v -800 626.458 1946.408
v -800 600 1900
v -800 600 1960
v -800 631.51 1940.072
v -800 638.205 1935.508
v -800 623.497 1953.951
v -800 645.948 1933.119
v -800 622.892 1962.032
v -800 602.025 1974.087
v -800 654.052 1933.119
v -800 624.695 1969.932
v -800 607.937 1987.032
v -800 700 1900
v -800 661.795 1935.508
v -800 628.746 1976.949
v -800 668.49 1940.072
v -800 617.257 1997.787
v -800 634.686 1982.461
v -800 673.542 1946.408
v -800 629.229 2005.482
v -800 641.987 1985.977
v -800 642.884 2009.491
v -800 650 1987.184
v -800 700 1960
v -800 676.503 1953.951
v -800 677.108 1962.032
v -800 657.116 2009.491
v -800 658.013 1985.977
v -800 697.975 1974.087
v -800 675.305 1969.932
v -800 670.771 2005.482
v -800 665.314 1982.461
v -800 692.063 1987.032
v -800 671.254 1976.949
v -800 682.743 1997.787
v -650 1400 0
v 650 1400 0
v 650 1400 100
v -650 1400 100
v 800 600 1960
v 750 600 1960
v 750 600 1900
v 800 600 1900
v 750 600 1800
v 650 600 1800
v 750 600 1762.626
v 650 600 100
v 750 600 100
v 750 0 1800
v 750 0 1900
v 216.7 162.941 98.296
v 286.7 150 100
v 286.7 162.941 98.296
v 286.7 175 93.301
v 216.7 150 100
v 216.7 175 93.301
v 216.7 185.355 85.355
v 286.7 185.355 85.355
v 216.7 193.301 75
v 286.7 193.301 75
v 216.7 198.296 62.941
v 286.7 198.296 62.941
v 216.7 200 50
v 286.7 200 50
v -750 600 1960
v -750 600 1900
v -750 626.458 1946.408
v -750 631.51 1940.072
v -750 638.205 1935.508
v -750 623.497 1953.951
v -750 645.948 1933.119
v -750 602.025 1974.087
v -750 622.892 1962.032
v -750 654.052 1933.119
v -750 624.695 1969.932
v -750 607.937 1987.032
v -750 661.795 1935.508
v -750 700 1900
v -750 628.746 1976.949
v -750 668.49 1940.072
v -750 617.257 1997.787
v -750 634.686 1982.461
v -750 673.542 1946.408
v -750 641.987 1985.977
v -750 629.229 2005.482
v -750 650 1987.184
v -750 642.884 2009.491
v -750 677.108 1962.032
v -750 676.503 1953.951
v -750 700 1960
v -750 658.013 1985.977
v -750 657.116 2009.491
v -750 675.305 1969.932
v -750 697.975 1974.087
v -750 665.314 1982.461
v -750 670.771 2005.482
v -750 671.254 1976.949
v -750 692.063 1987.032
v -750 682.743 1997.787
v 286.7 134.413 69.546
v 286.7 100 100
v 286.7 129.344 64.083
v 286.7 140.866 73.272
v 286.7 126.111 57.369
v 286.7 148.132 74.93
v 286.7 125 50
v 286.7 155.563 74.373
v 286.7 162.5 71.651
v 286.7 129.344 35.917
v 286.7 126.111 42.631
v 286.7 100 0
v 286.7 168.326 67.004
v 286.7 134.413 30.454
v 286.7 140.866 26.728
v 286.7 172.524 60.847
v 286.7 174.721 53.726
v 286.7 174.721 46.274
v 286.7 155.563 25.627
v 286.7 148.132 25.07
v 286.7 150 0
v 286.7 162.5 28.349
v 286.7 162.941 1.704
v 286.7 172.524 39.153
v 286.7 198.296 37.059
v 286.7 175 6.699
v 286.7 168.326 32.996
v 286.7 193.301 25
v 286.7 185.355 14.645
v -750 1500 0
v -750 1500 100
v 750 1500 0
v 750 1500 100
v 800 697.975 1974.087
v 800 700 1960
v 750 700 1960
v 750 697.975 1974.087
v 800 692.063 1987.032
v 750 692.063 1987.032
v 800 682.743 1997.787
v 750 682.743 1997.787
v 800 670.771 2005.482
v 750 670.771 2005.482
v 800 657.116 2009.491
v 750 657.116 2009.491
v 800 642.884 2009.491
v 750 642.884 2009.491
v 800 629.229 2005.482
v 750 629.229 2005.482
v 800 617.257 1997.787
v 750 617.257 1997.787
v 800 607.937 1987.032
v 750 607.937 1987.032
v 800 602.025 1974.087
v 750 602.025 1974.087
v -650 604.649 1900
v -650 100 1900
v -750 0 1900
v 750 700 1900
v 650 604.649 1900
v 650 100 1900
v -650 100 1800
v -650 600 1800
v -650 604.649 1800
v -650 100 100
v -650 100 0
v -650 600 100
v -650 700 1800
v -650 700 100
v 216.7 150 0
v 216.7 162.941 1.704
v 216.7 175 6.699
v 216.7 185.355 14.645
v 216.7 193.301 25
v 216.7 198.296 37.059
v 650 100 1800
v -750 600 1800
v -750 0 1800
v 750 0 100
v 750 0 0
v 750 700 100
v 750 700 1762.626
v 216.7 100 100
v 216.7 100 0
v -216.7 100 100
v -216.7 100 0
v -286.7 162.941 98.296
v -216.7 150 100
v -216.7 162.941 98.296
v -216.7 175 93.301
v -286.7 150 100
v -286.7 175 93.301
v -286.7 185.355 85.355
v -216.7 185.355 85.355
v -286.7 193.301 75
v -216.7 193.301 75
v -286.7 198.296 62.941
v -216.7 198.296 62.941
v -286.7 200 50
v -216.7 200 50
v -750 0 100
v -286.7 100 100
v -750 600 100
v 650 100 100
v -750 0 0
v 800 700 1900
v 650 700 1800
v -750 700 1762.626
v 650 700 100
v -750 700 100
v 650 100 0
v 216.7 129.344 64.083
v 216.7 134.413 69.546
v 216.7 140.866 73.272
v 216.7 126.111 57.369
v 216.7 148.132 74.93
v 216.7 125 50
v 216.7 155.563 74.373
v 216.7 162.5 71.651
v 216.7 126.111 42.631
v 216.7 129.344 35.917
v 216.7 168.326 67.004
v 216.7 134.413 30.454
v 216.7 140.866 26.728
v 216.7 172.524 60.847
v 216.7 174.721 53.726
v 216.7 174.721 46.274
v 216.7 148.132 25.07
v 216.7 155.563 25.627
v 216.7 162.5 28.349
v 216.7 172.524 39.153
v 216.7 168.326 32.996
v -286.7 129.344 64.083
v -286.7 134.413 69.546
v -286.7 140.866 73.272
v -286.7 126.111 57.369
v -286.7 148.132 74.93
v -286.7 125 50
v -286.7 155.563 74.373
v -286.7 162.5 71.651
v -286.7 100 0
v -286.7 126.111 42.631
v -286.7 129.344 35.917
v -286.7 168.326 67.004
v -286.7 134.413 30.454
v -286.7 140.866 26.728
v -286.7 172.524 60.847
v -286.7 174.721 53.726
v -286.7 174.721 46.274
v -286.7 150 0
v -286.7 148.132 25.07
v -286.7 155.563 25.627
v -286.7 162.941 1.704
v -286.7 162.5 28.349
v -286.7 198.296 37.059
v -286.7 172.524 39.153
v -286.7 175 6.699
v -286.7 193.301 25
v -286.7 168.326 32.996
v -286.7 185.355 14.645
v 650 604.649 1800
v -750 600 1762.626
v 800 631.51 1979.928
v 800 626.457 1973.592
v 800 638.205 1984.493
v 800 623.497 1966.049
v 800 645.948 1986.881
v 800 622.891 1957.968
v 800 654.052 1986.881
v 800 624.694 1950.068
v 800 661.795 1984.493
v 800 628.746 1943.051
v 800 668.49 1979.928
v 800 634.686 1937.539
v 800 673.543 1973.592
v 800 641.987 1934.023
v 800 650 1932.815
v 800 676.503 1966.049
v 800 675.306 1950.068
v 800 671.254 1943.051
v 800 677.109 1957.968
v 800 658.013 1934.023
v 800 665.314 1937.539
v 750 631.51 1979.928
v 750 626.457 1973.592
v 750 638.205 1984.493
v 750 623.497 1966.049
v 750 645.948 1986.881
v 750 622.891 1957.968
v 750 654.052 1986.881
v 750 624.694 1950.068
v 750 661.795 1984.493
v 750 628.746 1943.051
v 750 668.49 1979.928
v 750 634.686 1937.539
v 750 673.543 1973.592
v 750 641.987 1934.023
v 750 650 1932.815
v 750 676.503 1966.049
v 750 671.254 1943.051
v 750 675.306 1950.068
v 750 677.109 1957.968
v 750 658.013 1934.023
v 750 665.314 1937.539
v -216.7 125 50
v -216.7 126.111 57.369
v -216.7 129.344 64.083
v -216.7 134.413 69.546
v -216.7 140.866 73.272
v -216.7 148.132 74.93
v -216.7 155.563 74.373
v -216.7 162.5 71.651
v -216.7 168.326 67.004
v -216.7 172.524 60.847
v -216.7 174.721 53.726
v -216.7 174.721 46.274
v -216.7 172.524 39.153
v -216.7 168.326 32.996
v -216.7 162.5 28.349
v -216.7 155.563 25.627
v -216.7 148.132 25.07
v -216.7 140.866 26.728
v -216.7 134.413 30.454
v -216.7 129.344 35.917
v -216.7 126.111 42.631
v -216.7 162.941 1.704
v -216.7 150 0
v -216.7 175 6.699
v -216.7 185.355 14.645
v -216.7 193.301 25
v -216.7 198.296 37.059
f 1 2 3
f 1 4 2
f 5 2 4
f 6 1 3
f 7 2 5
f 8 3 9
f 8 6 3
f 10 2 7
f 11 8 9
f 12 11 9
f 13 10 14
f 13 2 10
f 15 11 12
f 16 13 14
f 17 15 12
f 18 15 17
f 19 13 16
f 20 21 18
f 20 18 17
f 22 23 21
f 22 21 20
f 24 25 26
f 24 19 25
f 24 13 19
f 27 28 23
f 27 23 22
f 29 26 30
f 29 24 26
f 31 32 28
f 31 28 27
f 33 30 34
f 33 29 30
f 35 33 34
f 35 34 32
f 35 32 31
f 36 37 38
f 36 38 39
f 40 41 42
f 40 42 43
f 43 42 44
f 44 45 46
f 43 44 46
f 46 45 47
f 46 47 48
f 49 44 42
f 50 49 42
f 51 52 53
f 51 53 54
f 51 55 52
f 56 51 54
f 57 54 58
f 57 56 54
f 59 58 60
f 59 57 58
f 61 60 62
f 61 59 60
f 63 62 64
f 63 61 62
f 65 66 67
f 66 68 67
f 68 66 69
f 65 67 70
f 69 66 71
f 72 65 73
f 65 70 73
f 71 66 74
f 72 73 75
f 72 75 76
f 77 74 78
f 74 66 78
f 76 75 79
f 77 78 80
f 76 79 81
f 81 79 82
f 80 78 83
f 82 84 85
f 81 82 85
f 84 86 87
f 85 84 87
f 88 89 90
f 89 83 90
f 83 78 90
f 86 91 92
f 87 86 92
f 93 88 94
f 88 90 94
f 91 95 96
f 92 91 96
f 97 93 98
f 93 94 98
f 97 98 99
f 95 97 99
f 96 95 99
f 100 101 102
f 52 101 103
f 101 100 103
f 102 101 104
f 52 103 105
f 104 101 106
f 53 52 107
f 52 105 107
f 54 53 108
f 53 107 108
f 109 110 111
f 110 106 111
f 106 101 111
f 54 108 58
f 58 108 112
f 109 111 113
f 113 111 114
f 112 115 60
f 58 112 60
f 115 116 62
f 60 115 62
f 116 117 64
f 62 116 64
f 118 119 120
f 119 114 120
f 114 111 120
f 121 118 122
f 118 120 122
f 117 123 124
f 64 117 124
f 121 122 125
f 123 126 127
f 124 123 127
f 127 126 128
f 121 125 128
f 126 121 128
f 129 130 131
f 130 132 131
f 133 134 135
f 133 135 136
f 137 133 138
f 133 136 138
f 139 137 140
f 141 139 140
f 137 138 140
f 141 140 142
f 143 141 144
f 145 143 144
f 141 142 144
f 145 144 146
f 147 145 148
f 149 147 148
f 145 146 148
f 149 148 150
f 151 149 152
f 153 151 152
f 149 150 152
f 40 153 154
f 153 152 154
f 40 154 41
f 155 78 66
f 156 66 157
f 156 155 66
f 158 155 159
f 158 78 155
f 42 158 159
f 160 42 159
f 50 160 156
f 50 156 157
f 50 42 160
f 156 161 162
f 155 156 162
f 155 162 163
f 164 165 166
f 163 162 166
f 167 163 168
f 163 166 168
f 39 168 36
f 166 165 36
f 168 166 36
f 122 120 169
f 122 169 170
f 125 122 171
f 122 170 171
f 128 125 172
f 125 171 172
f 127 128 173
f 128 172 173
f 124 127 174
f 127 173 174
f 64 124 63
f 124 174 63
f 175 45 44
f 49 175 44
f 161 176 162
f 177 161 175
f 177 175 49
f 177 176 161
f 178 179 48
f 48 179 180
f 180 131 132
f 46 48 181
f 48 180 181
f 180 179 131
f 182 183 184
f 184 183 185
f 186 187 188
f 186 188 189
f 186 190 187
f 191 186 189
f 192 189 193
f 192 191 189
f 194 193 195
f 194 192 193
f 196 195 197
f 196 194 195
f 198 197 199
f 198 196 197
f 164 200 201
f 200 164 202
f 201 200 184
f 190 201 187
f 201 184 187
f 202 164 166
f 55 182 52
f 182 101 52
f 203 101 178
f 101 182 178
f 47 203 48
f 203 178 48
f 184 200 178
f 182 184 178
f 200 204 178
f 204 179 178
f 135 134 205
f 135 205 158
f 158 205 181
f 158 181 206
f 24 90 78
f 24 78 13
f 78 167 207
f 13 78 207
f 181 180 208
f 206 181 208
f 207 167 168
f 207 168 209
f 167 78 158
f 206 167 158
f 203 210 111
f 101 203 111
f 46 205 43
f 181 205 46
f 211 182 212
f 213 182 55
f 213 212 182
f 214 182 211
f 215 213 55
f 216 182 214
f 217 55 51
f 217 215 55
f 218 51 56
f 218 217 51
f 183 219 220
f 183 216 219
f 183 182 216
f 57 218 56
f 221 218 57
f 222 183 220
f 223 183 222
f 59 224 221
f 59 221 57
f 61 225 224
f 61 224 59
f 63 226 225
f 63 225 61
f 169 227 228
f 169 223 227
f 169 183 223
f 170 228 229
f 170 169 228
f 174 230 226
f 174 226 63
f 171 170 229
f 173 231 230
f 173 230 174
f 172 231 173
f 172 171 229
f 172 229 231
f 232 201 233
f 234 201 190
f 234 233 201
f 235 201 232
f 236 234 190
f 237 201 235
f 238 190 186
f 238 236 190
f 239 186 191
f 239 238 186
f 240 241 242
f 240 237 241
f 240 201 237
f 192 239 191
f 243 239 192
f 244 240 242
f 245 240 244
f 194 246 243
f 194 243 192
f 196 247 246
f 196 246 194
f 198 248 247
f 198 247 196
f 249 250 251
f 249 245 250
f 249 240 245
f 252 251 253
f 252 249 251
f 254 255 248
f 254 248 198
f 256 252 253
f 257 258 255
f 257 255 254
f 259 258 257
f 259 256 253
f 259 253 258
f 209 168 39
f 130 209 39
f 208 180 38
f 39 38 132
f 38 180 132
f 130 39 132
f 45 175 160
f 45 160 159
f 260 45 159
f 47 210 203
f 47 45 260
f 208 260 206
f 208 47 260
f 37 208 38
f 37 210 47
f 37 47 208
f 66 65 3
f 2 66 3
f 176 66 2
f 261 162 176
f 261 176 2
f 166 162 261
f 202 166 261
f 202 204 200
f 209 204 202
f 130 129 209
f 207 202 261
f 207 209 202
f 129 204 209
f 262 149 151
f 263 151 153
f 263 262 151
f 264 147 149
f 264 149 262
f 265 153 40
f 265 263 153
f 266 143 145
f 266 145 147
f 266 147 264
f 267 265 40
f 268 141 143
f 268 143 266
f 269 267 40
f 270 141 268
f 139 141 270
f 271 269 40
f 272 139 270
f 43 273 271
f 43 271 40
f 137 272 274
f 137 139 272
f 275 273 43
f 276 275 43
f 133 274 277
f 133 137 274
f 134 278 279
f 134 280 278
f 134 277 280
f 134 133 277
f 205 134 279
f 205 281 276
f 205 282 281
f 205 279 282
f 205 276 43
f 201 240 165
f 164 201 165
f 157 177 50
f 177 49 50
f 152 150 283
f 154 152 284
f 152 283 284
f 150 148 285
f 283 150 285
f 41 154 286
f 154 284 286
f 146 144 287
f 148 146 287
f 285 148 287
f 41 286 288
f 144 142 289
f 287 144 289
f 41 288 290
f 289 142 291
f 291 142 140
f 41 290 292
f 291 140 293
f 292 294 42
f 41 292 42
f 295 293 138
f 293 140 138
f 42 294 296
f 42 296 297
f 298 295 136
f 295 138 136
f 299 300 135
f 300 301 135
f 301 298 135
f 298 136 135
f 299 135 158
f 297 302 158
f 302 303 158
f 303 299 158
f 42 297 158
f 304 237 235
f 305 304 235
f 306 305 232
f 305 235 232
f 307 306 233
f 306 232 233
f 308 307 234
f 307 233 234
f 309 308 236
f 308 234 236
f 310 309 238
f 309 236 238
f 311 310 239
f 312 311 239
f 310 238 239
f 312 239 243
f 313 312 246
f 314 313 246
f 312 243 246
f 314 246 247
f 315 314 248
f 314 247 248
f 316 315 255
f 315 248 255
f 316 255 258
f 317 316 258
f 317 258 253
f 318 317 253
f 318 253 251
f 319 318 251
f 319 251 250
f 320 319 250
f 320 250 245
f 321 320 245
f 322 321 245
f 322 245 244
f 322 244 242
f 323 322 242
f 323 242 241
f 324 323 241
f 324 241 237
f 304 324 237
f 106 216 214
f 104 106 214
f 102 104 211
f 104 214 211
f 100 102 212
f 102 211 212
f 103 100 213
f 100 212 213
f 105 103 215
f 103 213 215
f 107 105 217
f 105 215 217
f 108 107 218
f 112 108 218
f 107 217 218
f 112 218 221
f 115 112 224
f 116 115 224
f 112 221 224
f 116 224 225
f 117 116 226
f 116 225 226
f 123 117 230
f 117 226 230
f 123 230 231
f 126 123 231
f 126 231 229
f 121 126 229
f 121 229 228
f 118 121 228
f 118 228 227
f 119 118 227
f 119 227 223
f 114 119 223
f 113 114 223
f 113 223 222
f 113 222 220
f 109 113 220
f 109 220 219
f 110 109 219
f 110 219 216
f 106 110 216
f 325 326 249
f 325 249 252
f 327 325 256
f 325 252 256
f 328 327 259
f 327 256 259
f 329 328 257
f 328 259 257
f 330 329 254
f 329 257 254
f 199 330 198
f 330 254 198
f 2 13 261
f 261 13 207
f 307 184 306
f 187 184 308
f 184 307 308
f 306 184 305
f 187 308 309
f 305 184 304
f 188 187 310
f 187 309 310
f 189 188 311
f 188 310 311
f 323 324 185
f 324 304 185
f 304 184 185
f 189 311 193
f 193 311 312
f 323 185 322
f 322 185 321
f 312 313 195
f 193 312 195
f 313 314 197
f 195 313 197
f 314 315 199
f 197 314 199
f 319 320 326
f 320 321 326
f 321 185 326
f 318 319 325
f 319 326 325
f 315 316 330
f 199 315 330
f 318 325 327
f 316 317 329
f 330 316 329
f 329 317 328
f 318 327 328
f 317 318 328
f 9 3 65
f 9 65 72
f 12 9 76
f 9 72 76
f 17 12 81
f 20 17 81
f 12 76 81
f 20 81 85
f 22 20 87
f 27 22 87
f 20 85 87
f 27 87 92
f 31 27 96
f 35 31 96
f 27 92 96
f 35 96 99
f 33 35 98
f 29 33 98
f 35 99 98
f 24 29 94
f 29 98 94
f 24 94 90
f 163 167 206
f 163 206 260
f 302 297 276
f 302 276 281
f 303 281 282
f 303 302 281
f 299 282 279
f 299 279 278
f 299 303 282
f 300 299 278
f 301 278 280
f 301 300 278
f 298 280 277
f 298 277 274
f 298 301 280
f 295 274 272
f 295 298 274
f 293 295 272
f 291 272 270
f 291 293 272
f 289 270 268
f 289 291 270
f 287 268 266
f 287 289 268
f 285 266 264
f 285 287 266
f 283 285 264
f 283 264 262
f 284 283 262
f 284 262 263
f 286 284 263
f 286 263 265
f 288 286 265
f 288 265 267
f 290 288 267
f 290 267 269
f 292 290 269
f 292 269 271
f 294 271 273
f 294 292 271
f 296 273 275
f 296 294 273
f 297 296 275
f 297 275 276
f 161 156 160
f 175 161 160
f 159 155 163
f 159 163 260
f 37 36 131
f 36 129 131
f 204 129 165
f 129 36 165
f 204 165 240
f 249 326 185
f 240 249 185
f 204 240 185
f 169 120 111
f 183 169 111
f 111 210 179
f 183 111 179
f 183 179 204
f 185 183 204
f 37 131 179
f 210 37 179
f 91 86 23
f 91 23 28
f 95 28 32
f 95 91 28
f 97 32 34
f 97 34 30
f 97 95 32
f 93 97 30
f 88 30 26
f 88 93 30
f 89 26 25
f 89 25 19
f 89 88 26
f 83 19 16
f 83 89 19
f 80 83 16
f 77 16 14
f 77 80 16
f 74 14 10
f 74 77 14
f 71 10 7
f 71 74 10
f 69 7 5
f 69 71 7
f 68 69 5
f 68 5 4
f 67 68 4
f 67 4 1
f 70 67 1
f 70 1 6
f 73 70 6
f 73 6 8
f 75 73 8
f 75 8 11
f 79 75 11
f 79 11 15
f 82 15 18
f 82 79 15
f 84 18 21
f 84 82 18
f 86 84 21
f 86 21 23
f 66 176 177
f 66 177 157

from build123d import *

# Parameters (mm, degrees)
SALIENTE_EXTRUIR1_DEPTH = 750
CORTAR_EXTRUIR4_REACH   = 2536.265
CROQUIS3_W              = 1300
CROQUIS3_H              = 1300
CORTAR_EXTRUIR5_REACH   = 2536.265
CROQUIS4_W              = 1300
CROQUIS4_H              = 504.649156168
CROQUIS5_R              = 27.184697772
SALIENTE_EXTRUIR2_DEPTH = 50
SALIENTE_EXTRUIR3_DEPTH = 100
CROQUIS8_R              = 27.1845
SALIENTE_EXTRUIR4_DEPTH = 50
SALIENTE_EXTRUIR5_DEPTH = 100
CROQUIS11_W             = 70
CROQUIS11_H             = 100
SALIENTE_EXTRUIR6_DEPTH = 100
REDONDEO1_R             = 50
CORTAR_EXTRUIR6_REACH   = 2735.316
CROQUIS12_R             = 25


with BuildPart() as part:
    # Croquis1 → Saliente-Extruir1 (new, symmetric)
    with BuildSketch(Plane(origin=(0, 0, 0), x_dir=(0, 0, -1), z_dir=(1, 0, 0))):
        Polygon((-100, 700), (-100, 1500), (0, 1500), (0, 0), (-100, 0), (-100, 600), (-1800, 600), (-1800, 0), (-1900, 0), (-1900, 600), (-1900, 700), align=None)
    extrude(amount=SALIENTE_EXTRUIR1_DEPTH, both=True)

    # Cortar-Extruir4: up to this face of the body (flat: up to its plane)
    cortar_extruir4_end = Plane(part.part.faces().sort_by_distance((0, 300, 1800))[0])
    # Croquis3 → Cortar-Extruir4 (cut, up to the picked face)
    with BuildSketch(Plane(origin=(0, 0, 0), x_dir=(-1, 0, 0), z_dir=(0, 0, -1)), mode=Mode.PRIVATE) as cortar_extruir4_sk1:
        with Locations((0, 750)):
            Rectangle(CROQUIS3_W, CROQUIS3_H)
    cortar_extruir4_tool1 = split(extrude(cortar_extruir4_sk1.sketch, amount=-CORTAR_EXTRUIR4_REACH, mode=Mode.PRIVATE), bisect_by=cortar_extruir4_end, keep=Keep.BOTH, mode=Mode.PRIVATE)
    add(cortar_extruir4_tool1.solids().sort_by(Axis((0, 750, 0), (0, 0, 1)))[0], mode=Mode.SUBTRACT)

    # Croquis4 → Cortar-Extruir5 (cut, up to next)
    with BuildSketch(Plane.XY.offset(1900), mode=Mode.PRIVATE) as cortar_extruir5_sk1:
        with Locations((0, 352.324578084)):
            Rectangle(CROQUIS4_W, CROQUIS4_H)
    cortar_extruir5_tool1 = extrude(cortar_extruir5_sk1.sketch, amount=-CORTAR_EXTRUIR5_REACH, mode=Mode.PRIVATE) & part.part
    add(cortar_extruir5_tool1.solids().sort_by_distance((0, 352.324578, 1900))[0], mode=Mode.SUBTRACT)



with BuildPart() as body_2:
    # Croquis5 → Saliente-Extruir2 (new body)
    with BuildSketch(Plane(origin=(750, 0, 0), x_dir=(0, 0, -1), z_dir=(1, 0, 0))):
        with BuildLine():
            Line((-1960, 600), (-1900, 600))
            Line((-1900, 600), (-1900, 700))
            Line((-1900, 700), (-1960, 700))
            ThreePointArc((-1960, 700), (-2010, 650), (-1960, 600))
        make_face()
        with Locations((-1960, 650)):
            Circle(CROQUIS5_R, mode=Mode.SUBTRACT)
    extrude(amount=SALIENTE_EXTRUIR2_DEPTH)


with BuildPart() as part_1:
    add(part.part)

    add(body_2.part)  # Saliente-Extruir3 merges body 2
    # Croquis6 → Saliente-Extruir3 (add)
    with BuildSketch(Plane(origin=(0, 700, 0), x_dir=(1, 0, 0), z_dir=(0, 1, 0))):
        Polygon((750, -1900), (800, -1900), (750, -1762.626129027), align=None)
    extrude(amount=-SALIENTE_EXTRUIR3_DEPTH)



with BuildPart() as body_2_2:
    # Croquis8 → Saliente-Extruir4 (new body)
    with BuildSketch(Plane.ZY.offset(750)):
        with BuildLine():
            Line((1960, 700), (1900, 700))
            Line((1900, 700), (1900, 600))
            Line((1900, 600), (1960, 600))
            ThreePointArc((1960, 600), (2010, 650), (1960, 700))
        make_face()
        with Locations((1960, 650)):
            Circle(CROQUIS8_R, mode=Mode.SUBTRACT)
    extrude(amount=SALIENTE_EXTRUIR4_DEPTH)


with BuildPart() as part_2:
    add(part_1.part)

    add(body_2_2.part)  # Saliente-Extruir5 merges body 2 2
    # Croquis9 → Saliente-Extruir5 (add)
    with BuildSketch(Plane(origin=(0, 700, 0), x_dir=(1, 0, 0), z_dir=(0, 1, 0))):
        Polygon((-750, -1900), (-800, -1900), (-750, -1762.626129027), align=None)
    extrude(amount=-SALIENTE_EXTRUIR5_DEPTH)

    # Croquis11 → Saliente-Extruir6 (add)
    with BuildSketch(Plane(origin=(0, 0, 0), x_dir=(-1, 0, 0), z_dir=(0, 0, -1))):
        with Locations((-251.7, 150)):
            Rectangle(CROQUIS11_W, CROQUIS11_H)
        with Locations((251.7, 150)):
            Rectangle(CROQUIS11_W, CROQUIS11_H)
    extrude(amount=-SALIENTE_EXTRUIR6_DEPTH)

    # Redondeo1
    redondeo1_edges = [part_2.edges().sort_by_distance(p)[0] for p in [
        (251.7, 200, 100),
        (251.7, 200, 0),
        (-251.7, 200, 100),
        (-251.7, 200, 0),
    ]]
    fillet(redondeo1_edges, radius=REDONDEO1_R - 0.0001)  # a hair under: the kernel refuses the full size

    # Cortar-Extruir6: up to this face of the body (flat: up to its plane)
    cortar_extruir6_end = Plane(part_2.part.faces().sort_by_distance((286.7, 145.332525283, 50))[0])
    # Croquis12 → Cortar-Extruir6 (cut, up to the picked face)
    with BuildSketch(Plane.ZY.offset(286.7), mode=Mode.PRIVATE) as cortar_extruir6_sk1:
        with Locations(Location((50, 150, 0), (0, 0, 270))):
            Circle(CROQUIS12_R)
    cortar_extruir6_tool1 = split(extrude(cortar_extruir6_sk1.sketch, amount=-CORTAR_EXTRUIR6_REACH, mode=Mode.PRIVATE), bisect_by=cortar_extruir6_end, keep=Keep.BOTH, mode=Mode.PRIVATE)
    add(cortar_extruir6_tool1.solids().sort_by(Axis((-286.7, 150, 50), (1, 0, 0)))[0], mode=Mode.SUBTRACT)


solid = part_2.part
